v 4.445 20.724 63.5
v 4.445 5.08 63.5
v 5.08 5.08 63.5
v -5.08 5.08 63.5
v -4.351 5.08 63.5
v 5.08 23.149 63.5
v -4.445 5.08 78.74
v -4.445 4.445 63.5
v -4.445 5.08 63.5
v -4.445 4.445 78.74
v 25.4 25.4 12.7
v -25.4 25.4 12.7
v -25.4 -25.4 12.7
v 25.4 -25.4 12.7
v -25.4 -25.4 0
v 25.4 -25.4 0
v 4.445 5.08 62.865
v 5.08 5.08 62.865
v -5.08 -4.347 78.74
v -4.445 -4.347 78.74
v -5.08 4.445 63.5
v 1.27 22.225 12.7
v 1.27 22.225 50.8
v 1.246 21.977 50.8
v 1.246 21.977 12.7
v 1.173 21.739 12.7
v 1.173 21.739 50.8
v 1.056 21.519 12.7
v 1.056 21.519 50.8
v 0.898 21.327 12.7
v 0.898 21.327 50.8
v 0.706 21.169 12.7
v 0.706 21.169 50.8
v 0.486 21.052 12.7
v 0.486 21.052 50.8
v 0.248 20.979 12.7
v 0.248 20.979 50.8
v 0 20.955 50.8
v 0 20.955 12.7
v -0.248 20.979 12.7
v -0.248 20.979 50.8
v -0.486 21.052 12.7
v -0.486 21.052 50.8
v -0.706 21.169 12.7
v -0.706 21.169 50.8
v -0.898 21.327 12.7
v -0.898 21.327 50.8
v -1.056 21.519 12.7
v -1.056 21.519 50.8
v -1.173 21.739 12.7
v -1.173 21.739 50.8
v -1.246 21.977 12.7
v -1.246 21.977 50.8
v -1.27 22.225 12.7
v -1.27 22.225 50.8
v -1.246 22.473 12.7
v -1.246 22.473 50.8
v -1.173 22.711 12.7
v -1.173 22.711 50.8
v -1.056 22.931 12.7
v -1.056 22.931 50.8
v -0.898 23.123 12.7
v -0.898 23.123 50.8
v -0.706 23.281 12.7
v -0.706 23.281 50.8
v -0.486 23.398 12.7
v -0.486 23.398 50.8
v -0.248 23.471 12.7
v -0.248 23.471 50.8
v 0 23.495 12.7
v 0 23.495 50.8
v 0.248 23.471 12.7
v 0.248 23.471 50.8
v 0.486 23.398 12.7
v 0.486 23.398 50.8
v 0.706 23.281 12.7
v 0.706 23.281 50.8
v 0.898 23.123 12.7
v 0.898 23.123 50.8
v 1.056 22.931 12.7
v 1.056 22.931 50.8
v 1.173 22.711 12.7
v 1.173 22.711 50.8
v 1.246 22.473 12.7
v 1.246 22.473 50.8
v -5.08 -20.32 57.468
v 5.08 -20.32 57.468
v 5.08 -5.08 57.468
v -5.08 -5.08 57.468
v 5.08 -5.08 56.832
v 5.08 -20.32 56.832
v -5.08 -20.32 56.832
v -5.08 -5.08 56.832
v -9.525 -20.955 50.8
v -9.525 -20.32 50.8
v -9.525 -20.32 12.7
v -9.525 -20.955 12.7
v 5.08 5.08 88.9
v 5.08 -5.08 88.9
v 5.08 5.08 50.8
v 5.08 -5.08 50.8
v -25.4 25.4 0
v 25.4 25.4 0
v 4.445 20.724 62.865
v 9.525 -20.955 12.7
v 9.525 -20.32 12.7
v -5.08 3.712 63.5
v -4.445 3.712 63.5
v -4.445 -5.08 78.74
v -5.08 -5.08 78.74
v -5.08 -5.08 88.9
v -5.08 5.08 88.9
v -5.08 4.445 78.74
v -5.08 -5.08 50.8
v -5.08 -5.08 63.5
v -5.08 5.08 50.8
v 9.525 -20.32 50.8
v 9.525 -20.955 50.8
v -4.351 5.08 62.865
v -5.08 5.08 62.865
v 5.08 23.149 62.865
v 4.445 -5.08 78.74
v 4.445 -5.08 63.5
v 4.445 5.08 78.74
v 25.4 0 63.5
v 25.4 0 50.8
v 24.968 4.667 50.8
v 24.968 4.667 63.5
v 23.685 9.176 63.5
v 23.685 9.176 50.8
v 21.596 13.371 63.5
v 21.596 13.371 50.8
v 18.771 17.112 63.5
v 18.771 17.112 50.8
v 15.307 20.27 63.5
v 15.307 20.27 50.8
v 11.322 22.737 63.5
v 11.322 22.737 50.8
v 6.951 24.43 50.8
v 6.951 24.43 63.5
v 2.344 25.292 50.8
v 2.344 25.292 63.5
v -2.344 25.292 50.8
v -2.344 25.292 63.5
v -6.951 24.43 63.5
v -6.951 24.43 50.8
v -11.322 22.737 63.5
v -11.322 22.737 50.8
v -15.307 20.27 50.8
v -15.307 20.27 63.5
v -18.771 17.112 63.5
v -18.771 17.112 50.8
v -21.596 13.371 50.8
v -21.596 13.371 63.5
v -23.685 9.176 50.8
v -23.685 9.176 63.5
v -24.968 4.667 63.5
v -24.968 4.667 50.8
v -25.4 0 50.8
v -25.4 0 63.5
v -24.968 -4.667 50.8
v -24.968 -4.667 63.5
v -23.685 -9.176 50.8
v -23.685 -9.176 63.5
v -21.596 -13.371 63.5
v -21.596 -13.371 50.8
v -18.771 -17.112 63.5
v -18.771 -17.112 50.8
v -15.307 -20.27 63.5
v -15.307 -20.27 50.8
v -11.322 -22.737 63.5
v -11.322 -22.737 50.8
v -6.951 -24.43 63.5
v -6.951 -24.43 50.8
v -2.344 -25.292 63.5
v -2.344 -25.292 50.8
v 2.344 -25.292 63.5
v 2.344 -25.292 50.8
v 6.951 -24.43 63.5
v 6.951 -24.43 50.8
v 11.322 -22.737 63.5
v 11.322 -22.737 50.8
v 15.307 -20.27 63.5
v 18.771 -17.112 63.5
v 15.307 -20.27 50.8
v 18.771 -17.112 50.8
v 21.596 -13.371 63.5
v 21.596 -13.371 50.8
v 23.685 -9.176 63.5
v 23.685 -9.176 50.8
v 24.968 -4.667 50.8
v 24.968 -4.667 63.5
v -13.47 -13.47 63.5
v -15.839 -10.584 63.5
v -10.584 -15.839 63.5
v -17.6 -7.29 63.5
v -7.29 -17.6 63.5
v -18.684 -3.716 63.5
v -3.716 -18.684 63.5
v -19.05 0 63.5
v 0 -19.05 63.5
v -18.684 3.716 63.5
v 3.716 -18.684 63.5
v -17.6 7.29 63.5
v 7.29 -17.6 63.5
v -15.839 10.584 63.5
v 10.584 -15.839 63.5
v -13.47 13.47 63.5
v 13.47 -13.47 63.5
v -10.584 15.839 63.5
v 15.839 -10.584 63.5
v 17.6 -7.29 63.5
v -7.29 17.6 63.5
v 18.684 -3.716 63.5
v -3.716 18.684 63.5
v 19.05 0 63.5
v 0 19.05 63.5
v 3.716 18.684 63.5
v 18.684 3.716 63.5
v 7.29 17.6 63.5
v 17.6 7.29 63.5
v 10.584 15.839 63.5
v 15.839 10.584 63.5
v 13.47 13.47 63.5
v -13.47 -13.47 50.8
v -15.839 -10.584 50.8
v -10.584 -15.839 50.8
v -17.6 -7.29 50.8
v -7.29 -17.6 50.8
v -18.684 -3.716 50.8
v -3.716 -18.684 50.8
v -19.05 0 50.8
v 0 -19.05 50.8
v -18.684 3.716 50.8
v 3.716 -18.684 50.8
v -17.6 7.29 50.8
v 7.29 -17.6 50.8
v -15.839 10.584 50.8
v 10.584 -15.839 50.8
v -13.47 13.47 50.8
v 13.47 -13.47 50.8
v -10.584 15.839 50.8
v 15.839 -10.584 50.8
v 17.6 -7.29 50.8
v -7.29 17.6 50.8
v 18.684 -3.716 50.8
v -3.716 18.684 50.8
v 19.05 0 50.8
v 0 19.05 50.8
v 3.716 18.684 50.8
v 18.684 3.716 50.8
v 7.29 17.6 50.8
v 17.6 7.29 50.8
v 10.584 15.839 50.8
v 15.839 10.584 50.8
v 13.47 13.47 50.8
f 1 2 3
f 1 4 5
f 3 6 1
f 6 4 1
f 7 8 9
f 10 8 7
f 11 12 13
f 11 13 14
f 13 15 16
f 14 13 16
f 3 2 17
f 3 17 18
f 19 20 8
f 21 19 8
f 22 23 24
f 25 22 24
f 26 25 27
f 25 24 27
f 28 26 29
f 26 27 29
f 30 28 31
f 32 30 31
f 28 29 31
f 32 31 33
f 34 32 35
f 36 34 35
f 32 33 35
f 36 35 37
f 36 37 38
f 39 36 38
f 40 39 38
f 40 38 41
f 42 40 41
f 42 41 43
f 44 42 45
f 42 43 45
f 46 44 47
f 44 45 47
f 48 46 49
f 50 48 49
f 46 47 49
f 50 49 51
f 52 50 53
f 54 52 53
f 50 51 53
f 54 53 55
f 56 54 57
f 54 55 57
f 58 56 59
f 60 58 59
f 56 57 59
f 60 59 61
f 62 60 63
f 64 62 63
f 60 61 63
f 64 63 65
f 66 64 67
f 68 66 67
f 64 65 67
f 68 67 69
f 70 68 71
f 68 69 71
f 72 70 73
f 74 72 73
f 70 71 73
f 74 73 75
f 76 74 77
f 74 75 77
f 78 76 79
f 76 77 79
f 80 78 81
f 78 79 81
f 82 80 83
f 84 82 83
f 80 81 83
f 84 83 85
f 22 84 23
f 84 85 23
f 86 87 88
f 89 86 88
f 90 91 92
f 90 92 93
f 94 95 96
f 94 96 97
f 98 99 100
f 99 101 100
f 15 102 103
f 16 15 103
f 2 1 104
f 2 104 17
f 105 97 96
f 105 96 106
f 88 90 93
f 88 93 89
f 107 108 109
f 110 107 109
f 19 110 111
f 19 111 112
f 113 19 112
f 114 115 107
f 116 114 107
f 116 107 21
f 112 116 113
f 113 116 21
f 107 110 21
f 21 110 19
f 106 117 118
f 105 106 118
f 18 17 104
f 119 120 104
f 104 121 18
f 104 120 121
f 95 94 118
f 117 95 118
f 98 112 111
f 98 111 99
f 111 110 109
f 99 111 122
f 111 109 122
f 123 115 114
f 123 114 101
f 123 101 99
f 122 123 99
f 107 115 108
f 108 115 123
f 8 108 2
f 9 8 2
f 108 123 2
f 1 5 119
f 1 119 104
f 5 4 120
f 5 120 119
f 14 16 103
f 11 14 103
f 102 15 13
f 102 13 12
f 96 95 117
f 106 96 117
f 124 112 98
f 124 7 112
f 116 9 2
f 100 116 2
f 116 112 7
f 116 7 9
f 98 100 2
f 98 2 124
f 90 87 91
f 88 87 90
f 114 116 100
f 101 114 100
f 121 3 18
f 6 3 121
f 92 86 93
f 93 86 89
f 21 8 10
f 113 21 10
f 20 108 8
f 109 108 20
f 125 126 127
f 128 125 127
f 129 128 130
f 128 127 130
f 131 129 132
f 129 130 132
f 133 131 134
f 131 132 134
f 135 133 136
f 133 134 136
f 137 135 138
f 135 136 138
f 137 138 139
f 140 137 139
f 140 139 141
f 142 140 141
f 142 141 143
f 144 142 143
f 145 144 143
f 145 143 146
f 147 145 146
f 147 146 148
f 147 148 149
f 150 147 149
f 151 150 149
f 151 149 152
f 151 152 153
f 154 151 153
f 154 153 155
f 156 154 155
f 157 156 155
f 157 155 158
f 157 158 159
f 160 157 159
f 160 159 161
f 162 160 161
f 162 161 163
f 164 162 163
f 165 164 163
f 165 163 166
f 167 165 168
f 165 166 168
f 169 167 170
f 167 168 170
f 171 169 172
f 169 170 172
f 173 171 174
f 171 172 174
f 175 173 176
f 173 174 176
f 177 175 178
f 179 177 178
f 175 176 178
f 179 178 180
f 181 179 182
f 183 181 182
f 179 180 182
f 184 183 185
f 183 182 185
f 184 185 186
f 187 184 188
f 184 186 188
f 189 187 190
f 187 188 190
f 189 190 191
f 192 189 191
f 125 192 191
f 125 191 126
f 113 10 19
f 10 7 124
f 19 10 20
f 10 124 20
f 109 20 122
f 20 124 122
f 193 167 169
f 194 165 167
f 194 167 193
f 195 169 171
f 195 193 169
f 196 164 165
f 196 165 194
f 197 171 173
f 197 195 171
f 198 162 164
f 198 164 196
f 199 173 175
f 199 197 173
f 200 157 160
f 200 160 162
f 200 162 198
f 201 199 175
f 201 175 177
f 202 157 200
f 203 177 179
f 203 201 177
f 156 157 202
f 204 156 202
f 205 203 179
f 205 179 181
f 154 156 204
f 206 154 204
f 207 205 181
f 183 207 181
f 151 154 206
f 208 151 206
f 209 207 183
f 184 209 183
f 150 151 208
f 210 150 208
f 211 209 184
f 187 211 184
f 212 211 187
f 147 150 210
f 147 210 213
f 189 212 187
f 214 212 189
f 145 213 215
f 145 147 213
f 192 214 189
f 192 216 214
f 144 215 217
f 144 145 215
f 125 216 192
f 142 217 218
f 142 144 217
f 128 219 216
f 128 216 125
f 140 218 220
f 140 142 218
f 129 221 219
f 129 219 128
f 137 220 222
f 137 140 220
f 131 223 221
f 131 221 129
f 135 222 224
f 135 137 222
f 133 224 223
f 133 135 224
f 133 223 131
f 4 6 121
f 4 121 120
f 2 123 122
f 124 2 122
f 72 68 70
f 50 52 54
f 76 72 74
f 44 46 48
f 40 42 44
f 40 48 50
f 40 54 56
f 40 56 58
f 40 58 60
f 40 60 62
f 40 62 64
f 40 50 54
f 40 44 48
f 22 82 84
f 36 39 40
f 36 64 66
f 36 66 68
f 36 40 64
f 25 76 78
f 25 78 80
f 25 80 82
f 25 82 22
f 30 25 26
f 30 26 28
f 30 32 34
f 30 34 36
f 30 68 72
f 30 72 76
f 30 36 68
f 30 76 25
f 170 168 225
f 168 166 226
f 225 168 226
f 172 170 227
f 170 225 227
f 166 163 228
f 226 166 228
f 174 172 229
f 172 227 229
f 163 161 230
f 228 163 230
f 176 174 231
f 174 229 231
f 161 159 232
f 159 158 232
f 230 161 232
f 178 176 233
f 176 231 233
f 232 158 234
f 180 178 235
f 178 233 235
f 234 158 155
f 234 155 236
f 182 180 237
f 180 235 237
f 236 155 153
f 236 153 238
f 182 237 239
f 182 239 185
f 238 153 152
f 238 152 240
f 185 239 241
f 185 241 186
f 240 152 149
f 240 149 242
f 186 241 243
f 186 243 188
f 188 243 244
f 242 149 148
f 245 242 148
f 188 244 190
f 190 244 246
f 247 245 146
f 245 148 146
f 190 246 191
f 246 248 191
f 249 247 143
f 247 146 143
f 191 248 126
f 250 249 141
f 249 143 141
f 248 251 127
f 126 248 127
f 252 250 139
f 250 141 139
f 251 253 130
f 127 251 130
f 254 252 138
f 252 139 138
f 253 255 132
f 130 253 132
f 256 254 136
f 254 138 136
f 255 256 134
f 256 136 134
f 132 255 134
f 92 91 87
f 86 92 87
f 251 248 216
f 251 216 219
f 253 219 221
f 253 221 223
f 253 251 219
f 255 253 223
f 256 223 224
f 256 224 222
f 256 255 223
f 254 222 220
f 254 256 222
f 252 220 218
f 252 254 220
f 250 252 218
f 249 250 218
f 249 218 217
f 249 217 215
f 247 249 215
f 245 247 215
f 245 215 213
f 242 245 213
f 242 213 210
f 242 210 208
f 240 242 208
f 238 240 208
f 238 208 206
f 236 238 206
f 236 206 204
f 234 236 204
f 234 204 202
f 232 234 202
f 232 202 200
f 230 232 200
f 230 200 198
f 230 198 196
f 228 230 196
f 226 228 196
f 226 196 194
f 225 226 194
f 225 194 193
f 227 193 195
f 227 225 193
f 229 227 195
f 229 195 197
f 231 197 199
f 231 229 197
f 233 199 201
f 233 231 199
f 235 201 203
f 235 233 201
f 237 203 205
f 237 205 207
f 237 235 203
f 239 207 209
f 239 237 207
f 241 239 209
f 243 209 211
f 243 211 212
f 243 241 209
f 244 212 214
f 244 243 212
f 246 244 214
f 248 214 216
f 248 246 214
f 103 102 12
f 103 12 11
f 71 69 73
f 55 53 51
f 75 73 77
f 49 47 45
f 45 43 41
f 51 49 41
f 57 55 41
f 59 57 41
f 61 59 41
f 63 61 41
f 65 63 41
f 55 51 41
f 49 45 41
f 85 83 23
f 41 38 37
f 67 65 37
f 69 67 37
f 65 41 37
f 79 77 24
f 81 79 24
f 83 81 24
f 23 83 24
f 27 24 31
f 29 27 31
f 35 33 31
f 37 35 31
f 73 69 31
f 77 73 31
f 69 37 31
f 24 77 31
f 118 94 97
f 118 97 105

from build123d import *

# Parameters (mm, degrees)
F0_W          = 50.8
F0_H          = 50.8
F1_DEPTH      = 12.7
F2_R          = 25.4
F2_R_2        = 19.05
F3_DEPTH      = 63.5
F4_W          = 76.2
F4_H          = 38.1
F5_DEPTH      = 25.401
F5_DEPTH_BACK = 25.401
F6_R          = 1.27
F7_DEPTH      = 38.1
F6_W          = 19.05
F6_H          = 0.635
F8_W          = 10.16
F8_H          = 10.16
F9_DEPTH      = 12.7
F9_DEPTH_BACK = 25.4
F10_W         = 15.24
F10_H         = 0.635
F11_DEPTH     = 10.16
F12_W         = 8.89
F12_H         = 15.24
F13_DEPTH     = 10.16
F15_DEPTH     = 0.635
F17_DEPTH     = 5.5626


with BuildPart() as f1:
    # F0 (on Top) → F1 (new body)
    with BuildSketch(Plane.XY):
        Rectangle(F0_W, F0_H)
    extrude(amount=F1_DEPTH)

    # F2 (on Top) → F3 (join)
    with BuildSketch(Plane.XY):
        Circle(F2_R)
        Circle(F2_R_2, mode=Mode.SUBTRACT)
    extrude(amount=F3_DEPTH)

    # F4 (on Front) → F5 (cut, two sides)
    with BuildSketch(Plane.XZ) as f5_sk:
        with Locations((-2.8884448111, 31.75)):
            Rectangle(F4_W, F4_H)
    extrude(amount=F5_DEPTH, mode=Mode.SUBTRACT)
    extrude(f5_sk.sketch, amount=-F5_DEPTH_BACK, mode=Mode.SUBTRACT)


with BuildPart() as f7:
    # F6 (on face) → F7 (new body, through all)
    with BuildSketch(Plane(origin=(0, 0, 50.8), x_dir=(1, 0, 0), z_dir=(0, 0, -1))):
        with Locations((0, -22.225)):
            Circle(F6_R)
    extrude(amount=F7_DEPTH)


with BuildPart() as f7b:
    # F6 (on face) → F7, piece 2 (new body, through all)
    with BuildSketch(Plane(origin=(0, 0, 50.8), x_dir=(1, 0, 0), z_dir=(0, 0, -1))):
        with Locations((0, 20.6375)):
            Rectangle(F6_W, F6_H)
    extrude(amount=F7_DEPTH)


with BuildPart() as f9:
    # F8 (on face) → F9 (new body, two sides)
    with BuildSketch(Plane.XY.offset(63.5)) as f9_sk:
        Rectangle(F8_W, F8_H)
    extrude(amount=-F9_DEPTH)
    extrude(f9_sk.sketch, amount=F9_DEPTH_BACK)

    # F12 (on face) → F13 (cut, through all)
    with BuildSketch(Plane.XZ.offset(5.08)):
        with Locations((0, 71.12)):
            Rectangle(F12_W, F12_H)
    extrude(amount=-F13_DEPTH, mode=Mode.SUBTRACT)

    # F16 (on face) → F17 (cut)
    with BuildSketch(Plane.YZ.offset(-4.445)):
        Polygon((4.445, 63.5), (4.445, 78.74), (-4.3469090542, 78.74), align=None)
        Polygon((-5.08, 63.5), (3.7119090542, 63.5), (-5.08, 78.74), align=None)
    extrude(amount=-F17_DEPTH, mode=Mode.SUBTRACT)


with BuildPart() as f11:
    # F10 (on face) → F11 (new body, through all)
    with BuildSketch(Plane.YZ.offset(5.08)):
        with Locations((-12.7, 57.15)):
            Rectangle(F10_W, F10_H)
    extrude(amount=-F11_DEPTH)


with BuildPart() as f15:
    # F14 (on face) → F15 (new body)
    with BuildSketch(Plane.XY.offset(63.5)):
        Polygon((4.445, 5.08), (5.08, 5.08), (5.08, 23.1487335009), (-5.08, 5.08), (-4.3514974436, 5.08), (4.445, 20.7238551229), align=None)
    extrude(amount=-F15_DEPTH)


solid = Compound([f1.part, f7.part, f7b.part, f9.part, f11.part, f15.part])
